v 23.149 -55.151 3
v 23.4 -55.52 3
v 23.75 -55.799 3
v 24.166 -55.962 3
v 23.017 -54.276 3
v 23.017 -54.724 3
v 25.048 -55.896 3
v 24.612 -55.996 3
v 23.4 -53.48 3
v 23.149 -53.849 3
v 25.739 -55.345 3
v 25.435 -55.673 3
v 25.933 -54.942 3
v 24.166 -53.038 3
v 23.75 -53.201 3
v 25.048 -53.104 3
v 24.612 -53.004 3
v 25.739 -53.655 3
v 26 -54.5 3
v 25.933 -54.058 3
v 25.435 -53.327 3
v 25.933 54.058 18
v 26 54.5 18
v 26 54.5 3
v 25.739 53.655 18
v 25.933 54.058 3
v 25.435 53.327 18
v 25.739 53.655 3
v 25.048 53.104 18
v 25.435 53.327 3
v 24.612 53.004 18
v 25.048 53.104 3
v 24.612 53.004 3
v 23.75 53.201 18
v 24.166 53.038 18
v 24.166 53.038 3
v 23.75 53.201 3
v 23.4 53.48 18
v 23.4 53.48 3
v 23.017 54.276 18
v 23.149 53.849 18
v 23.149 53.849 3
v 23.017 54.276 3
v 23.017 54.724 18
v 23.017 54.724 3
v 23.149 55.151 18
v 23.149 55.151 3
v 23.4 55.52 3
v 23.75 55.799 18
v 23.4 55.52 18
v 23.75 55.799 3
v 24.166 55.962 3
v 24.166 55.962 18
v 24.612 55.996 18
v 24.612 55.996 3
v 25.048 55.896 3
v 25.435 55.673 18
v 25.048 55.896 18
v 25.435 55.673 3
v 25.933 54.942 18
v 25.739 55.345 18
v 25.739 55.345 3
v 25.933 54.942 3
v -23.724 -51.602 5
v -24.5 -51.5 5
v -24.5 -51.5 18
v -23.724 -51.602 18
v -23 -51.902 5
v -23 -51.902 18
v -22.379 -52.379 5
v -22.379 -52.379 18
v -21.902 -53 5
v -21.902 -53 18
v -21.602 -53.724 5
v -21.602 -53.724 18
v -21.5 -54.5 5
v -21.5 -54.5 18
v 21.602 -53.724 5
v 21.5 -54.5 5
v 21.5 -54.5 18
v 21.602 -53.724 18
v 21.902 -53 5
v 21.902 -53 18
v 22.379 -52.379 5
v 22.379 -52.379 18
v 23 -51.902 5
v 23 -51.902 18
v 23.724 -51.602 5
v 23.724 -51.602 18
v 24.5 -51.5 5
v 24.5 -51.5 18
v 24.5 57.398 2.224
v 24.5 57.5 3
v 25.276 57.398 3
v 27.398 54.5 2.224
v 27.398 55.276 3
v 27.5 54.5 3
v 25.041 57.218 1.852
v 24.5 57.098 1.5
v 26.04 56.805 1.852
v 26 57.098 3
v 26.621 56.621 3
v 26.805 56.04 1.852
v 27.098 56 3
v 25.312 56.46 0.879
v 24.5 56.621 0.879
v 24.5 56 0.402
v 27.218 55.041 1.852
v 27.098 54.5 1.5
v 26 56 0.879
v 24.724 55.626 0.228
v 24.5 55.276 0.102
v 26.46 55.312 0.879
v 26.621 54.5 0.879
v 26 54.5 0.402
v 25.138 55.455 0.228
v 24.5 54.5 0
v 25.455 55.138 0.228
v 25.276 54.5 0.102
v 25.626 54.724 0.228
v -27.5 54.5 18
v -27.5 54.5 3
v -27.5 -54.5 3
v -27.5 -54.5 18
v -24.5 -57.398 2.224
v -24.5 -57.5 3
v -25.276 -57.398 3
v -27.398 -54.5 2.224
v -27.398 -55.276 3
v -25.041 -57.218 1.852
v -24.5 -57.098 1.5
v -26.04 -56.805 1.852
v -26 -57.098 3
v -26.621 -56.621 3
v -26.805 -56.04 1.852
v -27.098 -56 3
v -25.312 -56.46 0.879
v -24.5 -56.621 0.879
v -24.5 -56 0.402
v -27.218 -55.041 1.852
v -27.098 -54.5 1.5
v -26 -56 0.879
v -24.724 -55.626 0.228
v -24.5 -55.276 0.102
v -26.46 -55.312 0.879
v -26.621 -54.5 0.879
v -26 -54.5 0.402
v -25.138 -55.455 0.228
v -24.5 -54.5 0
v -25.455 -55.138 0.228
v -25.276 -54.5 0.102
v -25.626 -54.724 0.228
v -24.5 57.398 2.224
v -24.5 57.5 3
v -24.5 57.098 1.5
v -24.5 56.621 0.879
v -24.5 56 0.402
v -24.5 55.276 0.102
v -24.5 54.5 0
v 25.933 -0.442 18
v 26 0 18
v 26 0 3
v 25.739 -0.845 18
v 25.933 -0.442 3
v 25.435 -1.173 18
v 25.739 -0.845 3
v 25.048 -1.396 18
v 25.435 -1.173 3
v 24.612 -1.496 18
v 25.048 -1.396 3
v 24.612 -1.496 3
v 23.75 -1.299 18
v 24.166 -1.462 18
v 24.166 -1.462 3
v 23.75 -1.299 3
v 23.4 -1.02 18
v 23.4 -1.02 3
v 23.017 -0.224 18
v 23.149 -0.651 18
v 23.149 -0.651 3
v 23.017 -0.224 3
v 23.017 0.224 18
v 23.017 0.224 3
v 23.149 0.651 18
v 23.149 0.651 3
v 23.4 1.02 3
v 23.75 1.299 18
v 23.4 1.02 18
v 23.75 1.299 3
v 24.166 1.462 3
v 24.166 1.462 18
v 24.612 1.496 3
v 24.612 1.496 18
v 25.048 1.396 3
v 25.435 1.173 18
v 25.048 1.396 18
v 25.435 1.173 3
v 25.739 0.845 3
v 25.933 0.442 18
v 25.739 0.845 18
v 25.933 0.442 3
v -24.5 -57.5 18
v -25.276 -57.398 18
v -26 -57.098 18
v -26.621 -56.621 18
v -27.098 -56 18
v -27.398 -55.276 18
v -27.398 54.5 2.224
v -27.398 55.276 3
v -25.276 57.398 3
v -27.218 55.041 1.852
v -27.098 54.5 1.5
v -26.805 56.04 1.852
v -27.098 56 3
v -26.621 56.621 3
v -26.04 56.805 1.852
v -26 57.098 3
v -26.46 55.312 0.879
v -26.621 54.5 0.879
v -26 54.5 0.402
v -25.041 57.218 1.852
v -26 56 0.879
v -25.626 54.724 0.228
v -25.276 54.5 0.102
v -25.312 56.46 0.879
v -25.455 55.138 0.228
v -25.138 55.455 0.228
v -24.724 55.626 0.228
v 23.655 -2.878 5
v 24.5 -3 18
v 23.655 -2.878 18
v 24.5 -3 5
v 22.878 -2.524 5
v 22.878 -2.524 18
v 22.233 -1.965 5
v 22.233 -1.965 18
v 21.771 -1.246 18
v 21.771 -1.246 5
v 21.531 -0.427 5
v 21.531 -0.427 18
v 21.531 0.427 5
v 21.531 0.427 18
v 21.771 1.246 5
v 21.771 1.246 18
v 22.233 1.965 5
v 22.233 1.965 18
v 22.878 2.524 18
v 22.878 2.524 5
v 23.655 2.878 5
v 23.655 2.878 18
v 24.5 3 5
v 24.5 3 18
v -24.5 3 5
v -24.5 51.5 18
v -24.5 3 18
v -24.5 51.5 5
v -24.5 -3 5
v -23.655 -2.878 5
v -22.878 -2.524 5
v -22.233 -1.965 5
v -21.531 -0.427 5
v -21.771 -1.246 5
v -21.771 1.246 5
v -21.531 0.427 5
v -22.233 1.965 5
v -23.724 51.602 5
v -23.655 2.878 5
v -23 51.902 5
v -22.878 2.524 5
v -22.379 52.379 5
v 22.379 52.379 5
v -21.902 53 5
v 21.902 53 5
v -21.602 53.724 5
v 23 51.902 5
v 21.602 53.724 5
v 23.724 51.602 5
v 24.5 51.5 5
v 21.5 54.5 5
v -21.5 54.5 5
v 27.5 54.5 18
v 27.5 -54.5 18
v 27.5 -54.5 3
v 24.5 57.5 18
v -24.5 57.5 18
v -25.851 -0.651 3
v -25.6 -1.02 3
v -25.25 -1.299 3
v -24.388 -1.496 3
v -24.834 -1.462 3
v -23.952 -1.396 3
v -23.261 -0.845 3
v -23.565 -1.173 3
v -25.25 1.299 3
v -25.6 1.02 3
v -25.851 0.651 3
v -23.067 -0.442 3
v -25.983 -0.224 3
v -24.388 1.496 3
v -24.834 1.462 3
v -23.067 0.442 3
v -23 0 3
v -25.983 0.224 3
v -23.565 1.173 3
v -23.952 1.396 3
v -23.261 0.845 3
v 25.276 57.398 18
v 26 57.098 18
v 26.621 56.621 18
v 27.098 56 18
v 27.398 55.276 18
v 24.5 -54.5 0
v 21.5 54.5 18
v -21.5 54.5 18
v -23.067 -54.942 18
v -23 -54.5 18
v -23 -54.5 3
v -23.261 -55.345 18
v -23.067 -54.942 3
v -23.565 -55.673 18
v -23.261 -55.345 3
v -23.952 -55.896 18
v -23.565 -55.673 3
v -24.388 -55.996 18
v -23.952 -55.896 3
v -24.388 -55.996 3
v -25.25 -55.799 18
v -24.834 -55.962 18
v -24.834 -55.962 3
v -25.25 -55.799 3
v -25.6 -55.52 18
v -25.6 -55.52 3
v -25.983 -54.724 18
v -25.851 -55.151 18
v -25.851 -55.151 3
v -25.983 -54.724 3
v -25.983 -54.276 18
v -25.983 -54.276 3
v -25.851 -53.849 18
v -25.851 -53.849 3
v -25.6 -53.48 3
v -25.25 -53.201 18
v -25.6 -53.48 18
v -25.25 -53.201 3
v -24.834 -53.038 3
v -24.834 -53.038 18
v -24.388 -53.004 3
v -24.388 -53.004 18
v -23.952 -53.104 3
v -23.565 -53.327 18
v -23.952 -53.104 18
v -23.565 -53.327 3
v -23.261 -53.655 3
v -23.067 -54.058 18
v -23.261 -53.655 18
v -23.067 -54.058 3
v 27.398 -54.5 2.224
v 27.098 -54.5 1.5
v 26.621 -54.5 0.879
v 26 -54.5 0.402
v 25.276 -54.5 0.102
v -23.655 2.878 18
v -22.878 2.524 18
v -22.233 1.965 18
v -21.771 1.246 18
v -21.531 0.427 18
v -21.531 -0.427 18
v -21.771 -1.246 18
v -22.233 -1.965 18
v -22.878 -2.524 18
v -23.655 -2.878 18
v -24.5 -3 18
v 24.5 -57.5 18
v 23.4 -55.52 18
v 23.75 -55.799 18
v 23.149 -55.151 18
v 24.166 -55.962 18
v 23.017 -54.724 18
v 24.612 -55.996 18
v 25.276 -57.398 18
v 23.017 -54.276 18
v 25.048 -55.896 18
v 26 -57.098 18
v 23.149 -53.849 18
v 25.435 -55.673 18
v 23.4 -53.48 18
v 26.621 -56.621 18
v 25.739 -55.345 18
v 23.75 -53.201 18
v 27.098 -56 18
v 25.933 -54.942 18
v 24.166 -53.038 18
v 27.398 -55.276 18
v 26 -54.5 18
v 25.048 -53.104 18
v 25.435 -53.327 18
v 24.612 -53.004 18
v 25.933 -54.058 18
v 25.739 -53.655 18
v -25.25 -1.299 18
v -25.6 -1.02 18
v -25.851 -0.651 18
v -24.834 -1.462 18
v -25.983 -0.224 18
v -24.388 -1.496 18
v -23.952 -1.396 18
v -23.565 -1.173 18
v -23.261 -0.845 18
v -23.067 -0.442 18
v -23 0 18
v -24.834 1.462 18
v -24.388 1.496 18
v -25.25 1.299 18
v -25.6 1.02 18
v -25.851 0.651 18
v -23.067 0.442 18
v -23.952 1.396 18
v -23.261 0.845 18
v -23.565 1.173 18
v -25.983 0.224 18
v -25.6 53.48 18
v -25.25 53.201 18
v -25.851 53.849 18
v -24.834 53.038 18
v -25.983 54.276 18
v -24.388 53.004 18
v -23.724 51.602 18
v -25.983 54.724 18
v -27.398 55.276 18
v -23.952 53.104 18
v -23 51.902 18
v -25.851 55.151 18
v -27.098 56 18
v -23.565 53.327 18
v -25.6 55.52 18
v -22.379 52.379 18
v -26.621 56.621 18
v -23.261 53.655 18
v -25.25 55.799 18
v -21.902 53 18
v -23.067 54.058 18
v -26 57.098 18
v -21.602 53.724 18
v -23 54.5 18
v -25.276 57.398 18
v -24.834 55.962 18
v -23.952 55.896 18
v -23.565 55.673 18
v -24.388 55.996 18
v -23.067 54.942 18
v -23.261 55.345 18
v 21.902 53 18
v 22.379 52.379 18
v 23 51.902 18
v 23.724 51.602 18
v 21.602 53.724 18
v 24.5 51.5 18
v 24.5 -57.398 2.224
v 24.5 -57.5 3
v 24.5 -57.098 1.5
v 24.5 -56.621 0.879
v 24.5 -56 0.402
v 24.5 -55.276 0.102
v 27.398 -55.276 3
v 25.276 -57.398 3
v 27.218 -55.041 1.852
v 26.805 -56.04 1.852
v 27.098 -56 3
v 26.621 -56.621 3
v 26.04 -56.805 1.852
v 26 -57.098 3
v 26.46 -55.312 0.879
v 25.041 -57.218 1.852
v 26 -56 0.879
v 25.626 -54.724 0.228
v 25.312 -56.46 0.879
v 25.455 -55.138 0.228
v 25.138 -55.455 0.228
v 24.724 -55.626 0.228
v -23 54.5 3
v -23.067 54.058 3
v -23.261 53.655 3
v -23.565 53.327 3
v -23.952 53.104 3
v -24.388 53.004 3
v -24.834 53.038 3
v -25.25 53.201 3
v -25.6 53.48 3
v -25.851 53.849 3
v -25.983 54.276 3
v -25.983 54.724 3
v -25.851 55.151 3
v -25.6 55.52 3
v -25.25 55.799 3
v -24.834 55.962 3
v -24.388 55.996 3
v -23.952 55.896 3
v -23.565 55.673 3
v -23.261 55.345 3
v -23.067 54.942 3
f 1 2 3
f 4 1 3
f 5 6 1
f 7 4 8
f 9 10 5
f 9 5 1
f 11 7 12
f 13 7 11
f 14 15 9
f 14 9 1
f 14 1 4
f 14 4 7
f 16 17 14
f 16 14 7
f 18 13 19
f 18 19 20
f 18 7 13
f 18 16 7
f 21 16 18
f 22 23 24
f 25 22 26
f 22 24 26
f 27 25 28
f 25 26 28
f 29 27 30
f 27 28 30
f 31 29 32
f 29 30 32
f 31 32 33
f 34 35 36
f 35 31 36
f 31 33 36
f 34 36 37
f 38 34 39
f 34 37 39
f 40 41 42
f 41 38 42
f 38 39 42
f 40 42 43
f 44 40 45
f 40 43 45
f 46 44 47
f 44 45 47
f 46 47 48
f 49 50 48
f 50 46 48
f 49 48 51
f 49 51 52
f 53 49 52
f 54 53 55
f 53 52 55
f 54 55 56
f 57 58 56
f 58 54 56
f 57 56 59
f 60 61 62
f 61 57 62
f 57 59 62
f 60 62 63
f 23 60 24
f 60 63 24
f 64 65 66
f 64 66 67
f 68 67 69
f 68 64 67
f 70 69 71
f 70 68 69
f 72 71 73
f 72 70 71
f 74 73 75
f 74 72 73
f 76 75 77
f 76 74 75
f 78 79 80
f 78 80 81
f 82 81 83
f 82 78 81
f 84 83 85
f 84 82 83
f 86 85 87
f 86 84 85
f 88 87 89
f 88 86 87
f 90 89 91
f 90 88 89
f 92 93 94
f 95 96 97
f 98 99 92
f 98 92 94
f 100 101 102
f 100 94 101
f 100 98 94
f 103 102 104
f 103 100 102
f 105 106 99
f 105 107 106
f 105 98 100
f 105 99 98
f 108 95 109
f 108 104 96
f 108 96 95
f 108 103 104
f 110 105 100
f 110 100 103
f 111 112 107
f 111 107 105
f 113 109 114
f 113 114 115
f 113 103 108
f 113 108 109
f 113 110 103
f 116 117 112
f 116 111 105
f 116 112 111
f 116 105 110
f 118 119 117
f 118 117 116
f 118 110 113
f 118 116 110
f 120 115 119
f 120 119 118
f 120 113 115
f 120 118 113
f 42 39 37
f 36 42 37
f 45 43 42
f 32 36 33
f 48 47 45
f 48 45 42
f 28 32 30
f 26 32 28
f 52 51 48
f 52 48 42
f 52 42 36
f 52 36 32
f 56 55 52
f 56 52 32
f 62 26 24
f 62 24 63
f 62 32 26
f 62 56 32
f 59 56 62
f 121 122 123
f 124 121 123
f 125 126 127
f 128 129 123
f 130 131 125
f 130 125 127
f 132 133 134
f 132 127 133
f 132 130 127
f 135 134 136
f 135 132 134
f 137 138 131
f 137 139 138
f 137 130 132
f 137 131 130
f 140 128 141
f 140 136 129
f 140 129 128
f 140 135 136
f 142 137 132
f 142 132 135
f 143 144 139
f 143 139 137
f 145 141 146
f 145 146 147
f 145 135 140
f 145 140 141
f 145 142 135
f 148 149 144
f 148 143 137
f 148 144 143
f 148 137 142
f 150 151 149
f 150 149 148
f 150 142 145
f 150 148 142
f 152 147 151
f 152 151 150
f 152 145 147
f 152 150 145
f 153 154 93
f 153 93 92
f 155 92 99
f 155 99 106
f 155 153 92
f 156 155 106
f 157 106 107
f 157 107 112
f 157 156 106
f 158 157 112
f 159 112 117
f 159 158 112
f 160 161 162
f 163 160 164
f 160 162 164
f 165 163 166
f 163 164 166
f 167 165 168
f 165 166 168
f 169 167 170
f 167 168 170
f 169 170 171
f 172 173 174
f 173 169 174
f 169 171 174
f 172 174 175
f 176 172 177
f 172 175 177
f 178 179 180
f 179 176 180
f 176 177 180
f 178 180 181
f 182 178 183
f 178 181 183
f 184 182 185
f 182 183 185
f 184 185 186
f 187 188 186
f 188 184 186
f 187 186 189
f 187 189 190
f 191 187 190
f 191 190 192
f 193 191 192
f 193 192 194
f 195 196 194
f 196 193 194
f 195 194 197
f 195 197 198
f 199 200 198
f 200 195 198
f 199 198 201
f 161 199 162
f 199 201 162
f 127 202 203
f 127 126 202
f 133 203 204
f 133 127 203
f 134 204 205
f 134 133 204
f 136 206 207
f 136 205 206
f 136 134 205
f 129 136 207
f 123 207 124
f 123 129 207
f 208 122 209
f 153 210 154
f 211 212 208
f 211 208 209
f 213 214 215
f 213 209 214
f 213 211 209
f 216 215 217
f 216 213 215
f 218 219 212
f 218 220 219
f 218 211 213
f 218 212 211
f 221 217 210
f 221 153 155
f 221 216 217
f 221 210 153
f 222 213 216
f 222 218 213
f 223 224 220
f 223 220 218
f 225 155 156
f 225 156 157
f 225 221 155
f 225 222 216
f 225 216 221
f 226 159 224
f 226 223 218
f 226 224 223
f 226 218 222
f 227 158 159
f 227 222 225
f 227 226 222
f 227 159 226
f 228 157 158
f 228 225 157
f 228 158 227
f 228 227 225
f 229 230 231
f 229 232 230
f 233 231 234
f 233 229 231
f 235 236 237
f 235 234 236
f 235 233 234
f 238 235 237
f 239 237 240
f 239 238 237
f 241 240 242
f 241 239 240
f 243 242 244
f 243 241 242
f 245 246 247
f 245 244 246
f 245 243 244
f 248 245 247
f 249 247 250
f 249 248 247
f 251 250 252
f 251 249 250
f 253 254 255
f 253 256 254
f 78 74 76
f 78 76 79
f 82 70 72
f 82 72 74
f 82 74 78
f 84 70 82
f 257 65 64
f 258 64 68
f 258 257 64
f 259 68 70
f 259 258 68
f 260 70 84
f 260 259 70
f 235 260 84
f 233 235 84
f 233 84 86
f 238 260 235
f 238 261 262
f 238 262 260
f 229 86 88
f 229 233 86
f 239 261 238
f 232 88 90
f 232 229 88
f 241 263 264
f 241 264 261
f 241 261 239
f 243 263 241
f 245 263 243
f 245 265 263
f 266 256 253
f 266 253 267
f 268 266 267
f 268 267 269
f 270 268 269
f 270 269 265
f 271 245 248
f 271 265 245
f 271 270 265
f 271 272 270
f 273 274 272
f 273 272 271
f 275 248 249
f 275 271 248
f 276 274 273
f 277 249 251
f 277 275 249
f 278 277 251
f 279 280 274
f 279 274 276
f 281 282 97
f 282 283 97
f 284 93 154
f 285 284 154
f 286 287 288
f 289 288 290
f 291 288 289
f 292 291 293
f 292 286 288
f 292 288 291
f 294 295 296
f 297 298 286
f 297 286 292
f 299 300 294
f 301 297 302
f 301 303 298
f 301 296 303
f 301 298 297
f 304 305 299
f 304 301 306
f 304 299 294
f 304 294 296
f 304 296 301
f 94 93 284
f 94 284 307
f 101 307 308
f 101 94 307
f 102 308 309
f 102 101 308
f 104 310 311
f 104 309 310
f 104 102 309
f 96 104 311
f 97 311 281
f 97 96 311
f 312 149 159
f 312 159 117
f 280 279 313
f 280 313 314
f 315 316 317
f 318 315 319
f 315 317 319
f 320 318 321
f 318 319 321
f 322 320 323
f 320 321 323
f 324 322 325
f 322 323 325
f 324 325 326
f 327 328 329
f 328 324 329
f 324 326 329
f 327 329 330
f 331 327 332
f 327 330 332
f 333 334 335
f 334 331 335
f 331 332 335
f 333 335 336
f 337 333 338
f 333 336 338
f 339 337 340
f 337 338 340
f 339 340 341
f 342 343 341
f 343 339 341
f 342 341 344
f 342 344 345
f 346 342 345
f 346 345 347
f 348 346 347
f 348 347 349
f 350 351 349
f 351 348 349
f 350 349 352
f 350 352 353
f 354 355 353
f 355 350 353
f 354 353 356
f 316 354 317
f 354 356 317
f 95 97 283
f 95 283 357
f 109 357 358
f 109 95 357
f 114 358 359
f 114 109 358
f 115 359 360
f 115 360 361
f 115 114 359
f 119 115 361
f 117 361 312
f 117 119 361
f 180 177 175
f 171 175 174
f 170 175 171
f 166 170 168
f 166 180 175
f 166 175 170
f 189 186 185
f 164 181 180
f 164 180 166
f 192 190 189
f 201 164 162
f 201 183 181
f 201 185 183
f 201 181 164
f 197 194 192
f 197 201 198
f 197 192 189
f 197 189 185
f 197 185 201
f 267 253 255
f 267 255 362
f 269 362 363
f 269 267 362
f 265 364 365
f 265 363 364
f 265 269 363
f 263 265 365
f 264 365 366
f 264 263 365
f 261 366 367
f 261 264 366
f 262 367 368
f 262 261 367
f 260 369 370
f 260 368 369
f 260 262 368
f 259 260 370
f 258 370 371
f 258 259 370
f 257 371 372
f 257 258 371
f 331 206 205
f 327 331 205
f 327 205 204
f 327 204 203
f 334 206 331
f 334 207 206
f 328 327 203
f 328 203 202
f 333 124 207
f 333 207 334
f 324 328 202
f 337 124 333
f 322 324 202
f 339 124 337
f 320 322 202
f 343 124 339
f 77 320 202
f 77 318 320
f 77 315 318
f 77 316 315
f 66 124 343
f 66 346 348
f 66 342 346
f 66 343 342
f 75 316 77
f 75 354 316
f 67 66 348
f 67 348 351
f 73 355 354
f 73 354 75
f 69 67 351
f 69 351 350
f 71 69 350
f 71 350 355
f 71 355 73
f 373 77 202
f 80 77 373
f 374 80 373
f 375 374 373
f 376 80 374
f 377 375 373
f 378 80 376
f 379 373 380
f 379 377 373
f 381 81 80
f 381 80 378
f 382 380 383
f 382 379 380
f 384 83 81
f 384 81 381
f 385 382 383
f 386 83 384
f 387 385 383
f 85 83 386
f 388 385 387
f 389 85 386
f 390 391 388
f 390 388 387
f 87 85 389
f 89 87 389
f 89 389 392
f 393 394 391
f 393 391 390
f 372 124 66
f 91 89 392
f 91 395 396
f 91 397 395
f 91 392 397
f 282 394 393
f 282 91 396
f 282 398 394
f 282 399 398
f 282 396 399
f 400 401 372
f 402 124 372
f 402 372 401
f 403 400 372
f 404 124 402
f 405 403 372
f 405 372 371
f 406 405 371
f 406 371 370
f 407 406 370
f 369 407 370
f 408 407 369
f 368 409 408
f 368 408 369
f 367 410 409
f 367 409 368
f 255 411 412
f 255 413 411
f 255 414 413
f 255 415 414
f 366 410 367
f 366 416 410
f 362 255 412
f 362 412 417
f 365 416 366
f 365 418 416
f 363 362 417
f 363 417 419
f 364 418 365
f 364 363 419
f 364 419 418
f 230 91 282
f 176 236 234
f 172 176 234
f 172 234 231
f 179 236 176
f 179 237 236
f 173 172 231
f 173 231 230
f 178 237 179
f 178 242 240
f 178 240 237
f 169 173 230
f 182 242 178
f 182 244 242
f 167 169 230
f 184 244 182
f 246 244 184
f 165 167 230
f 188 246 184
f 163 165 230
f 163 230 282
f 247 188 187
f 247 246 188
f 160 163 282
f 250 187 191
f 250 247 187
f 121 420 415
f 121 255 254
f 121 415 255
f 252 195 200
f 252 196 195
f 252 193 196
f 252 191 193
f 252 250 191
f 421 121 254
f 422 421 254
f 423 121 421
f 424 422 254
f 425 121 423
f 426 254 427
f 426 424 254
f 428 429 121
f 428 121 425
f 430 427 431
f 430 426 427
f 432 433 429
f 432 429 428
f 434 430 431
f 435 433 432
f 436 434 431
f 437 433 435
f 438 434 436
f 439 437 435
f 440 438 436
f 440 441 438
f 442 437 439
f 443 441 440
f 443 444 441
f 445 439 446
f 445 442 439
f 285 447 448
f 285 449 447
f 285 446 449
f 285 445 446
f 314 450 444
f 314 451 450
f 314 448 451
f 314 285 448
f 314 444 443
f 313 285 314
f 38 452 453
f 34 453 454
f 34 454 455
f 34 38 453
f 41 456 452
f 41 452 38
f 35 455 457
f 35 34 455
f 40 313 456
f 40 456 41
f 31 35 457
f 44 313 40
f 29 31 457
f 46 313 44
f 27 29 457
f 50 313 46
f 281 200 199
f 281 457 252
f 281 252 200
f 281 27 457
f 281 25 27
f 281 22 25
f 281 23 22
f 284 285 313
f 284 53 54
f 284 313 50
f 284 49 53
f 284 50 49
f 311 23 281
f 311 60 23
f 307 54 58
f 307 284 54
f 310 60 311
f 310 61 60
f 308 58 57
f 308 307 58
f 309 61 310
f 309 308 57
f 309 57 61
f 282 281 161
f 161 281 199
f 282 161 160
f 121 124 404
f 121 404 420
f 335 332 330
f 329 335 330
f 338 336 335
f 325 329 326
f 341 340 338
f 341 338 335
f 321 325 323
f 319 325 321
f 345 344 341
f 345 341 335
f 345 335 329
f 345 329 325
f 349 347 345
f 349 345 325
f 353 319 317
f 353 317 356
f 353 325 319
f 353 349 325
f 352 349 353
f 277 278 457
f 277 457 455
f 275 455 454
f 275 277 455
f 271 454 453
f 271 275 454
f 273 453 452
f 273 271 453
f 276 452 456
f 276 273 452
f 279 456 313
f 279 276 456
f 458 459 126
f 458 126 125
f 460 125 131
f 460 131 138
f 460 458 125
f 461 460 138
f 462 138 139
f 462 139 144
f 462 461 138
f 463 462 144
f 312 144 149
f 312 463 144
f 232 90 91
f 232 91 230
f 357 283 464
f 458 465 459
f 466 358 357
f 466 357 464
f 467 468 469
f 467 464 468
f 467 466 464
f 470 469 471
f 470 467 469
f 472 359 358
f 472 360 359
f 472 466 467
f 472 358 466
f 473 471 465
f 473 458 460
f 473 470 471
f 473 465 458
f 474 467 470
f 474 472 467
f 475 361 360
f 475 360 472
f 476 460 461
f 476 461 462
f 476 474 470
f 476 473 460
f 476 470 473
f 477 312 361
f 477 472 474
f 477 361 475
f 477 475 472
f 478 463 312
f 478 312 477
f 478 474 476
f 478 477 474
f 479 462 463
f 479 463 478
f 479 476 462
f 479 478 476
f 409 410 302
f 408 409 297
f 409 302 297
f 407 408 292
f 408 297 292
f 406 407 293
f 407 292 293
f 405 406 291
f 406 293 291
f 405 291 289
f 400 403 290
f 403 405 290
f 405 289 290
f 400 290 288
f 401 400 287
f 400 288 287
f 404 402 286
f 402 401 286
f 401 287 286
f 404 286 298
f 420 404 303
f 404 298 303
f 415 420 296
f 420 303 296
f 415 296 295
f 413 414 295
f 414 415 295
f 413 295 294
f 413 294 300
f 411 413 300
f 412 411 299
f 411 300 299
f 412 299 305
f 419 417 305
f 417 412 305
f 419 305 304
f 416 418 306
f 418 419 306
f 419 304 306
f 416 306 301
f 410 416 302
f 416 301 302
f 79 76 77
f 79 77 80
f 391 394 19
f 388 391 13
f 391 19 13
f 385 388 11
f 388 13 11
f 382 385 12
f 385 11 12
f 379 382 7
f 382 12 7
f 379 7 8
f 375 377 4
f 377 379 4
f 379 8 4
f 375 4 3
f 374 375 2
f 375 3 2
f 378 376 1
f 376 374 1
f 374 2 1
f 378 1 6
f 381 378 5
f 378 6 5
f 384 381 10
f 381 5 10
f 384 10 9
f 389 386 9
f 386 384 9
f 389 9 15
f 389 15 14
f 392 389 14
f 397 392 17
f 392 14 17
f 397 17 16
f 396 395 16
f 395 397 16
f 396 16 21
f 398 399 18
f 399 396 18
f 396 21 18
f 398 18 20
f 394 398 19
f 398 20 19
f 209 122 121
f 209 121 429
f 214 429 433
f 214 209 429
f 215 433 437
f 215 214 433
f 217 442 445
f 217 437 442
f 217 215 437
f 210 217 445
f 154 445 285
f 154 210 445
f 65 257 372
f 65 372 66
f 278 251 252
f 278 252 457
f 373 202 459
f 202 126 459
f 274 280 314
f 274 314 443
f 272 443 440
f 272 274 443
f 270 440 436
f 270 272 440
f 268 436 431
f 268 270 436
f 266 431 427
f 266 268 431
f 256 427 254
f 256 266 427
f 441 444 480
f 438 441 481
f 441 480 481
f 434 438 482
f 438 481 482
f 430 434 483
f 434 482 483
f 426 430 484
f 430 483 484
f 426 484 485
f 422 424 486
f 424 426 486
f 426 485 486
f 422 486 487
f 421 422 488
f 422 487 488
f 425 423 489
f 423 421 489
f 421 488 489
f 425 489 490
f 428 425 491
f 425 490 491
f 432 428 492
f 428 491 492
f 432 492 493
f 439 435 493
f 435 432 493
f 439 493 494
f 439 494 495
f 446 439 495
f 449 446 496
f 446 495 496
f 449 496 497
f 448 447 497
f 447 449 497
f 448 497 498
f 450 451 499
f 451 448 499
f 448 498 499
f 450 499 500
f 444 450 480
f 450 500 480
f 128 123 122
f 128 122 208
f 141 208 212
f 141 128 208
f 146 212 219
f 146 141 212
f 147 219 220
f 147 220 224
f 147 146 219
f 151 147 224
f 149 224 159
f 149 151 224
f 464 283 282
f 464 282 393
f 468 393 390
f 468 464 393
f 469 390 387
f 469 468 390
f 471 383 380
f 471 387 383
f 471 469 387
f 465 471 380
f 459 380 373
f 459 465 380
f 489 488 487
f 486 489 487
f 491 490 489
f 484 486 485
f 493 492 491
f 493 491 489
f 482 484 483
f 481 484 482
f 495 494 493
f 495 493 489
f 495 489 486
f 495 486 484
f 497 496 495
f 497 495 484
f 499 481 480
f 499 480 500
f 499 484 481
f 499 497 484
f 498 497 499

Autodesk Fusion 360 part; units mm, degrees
sketch "Boceto1" plane through (0, 0, 0) normal (0, 0, 1) x (1, 0, 0)
  line L0 (-24.5, -57.5) -> (24.5, -57.5)
  line L1 (27.5, -54.5) -> (27.5, 54.5)
  line L2 (24.5, 57.5) -> (-24.5, 57.5)
  line L3 (-27.5, 54.5) -> (-27.5, -54.5)
  arc A0 (-24.5, 57.5) -> (-27.5, 54.5) centre (-24.5, 54.5) ccw
  arc A1 (27.5, 54.5) -> (24.5, 57.5) centre (24.5, 54.5) ccw
  arc A2 (-27.5, -54.5) -> (-24.5, -57.5) centre (-24.5, -54.5) ccw
  arc A3 (24.5, -57.5) -> (27.5, -54.5) centre (24.5, -54.5) ccw
  circle A4 centre (-24.5, 54.5) radius 1.5
  circle A5 centre (24.5, 54.5) radius 1.5
  circle A6 centre (-24.5, -54.5) radius 1.5
  circle A7 centre (24.5, -54.5) radius 1.5
  line L4 (21.5, 54.5) -> (-21.5, 54.5)
  line L5 (-27.5, -57.5) -> (-26.9159, -56.2786) construction
  arc A8 (-27.5, -54.5) -> (-24.5, -57.5) centre (-24.5, -54.5) ccw
  arc A9 (-21.5, -54.5) -> (-24.5, -51.5) centre (-24.5, -54.5) ccw
  line L6 (-21.5, -54.5) -> (21.5, -54.5)
  arc A10 (24.5, -57.5) -> (27.5, -54.5) centre (24.5, -54.5) ccw
  arc A11 (24.5, -51.5) -> (21.5, -54.5) centre (24.5, -54.5) ccw
  line L7 (27.5, -57.5) -> (26.9159, -56.2786) construction
  arc A12 (27.5, 54.5) -> (24.5, 57.5) centre (24.5, 54.5) ccw
  arc A13 (21.5, 54.5) -> (24.5, 51.5) centre (24.5, 54.5) ccw
  arc A14 (-24.5, 57.5) -> (-27.5, 54.5) centre (-24.5, 54.5) ccw
  arc A15 (-24.5, 51.5) -> (-21.5, 54.5) centre (-24.5, 54.5) ccw
  circle A16 centre (-24.5, 0) radius 1.5
  line L8 (-24.5, 51.5) -> (-24.5, 3)
  line L9 (-24.5, -3) -> (-24.5, -51.5)
  arc A17 (-24.5, -3) -> (-24.5, 3) centre (-24.5, 0) ccw
  circle A18 centre (24.5, 0) radius 1.5
  line L10 (24.5, -51.5) -> (24.5, -3)
  line L11 (24.5, 3) -> (24.5, 51.5)
  arc A19 (24.5, 3) -> (24.5, -3) centre (24.5, 0) ccw
  dimension "d3" = 3
  dimension "d4" = 3
  dimension "d5" = 3
  dimension "d6" = 3
  dimension "d7" = 6
  dimension "d8" = 6
  dimension "d9" = 6
  dimension "d10" = 6
  dimension "d11" = 3
  dimension "d12" = 3
  dimension "d13" = 3
  dimension "d14" = 3
  dimension "d15" = 6
  dimension "d16" = 3
  dimension "d17" = 6
  dimension "d18" = 3
extrude "Extruir1" add sketch "Boceto1" along normal blind 18
extrude "Extruir2" cut sketch "Boceto1" along normal blind 3 contours L0 L1 L2 L3 A0 A1 A2 A3 A8 A10 A12 A14 | A4 | A5 | A6 | A7 | L4 A9 L6 A11 A13 A15 L8 L9 A17 L10 L11 A19 | A16 | A18
extrude "Extruir3" add sketch "Boceto1" along normal blind 3 contours L0 L1 L2 L3 A0 A1 A2 A3 A8 A10 A12 A14 | A4 | A5 | A6 | A7 | L4 A9 L6 A11 A13 A15 L8 L9 A17 L10 L11 A19 | A16 | A18
fillet "Empalme1" radius 3 1 faces at (-9.1667, 18.1667, 0)
extrude "Extruir4" add 1 faces at (-7.4865, 35.5549, 3) along direction (0, 0, 1) blind 2
